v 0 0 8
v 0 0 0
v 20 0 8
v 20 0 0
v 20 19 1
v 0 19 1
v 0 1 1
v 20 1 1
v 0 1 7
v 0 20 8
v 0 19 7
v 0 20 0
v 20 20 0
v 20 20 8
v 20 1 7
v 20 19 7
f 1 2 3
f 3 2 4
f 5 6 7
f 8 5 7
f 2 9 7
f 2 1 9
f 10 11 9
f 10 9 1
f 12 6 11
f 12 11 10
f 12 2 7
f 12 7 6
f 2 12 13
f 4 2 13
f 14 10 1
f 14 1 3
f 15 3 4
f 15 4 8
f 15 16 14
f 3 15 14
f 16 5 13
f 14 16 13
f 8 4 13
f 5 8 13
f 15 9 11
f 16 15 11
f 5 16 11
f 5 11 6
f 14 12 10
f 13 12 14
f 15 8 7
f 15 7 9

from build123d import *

# Parameters (mm, degrees)
F0_W     = 20
F0_H     = 20
F1_DEPTH = 8
F2_T     = -1
F4_DEPTH = 2


with BuildPart() as f1:
    # F0 (on Top) → F1 (new body)
    with BuildSketch(Plane.XY):
        with Locations((10, 10)):
            Rectangle(F0_W, F0_H)
    extrude(amount=F1_DEPTH)

    # F2
    f2_openings = [f1.faces().sort_by_distance(p)[0] for p in [
        (20, 10, 4),
    ]]
    offset(amount=F2_T, openings=f2_openings)

    # F3 (on face) → F4 (cut)
    with BuildSketch(Plane(origin=(0, 0, 0), x_dir=(0, -1, 0), z_dir=(-1, 0, 0))):
        Polygon((-19, 7), (-19, 4.001057), (-19, 1), (-1, 1), (-1, 7), align=None)
    extrude(amount=-F4_DEPTH, mode=Mode.SUBTRACT)


solid = f1.part
